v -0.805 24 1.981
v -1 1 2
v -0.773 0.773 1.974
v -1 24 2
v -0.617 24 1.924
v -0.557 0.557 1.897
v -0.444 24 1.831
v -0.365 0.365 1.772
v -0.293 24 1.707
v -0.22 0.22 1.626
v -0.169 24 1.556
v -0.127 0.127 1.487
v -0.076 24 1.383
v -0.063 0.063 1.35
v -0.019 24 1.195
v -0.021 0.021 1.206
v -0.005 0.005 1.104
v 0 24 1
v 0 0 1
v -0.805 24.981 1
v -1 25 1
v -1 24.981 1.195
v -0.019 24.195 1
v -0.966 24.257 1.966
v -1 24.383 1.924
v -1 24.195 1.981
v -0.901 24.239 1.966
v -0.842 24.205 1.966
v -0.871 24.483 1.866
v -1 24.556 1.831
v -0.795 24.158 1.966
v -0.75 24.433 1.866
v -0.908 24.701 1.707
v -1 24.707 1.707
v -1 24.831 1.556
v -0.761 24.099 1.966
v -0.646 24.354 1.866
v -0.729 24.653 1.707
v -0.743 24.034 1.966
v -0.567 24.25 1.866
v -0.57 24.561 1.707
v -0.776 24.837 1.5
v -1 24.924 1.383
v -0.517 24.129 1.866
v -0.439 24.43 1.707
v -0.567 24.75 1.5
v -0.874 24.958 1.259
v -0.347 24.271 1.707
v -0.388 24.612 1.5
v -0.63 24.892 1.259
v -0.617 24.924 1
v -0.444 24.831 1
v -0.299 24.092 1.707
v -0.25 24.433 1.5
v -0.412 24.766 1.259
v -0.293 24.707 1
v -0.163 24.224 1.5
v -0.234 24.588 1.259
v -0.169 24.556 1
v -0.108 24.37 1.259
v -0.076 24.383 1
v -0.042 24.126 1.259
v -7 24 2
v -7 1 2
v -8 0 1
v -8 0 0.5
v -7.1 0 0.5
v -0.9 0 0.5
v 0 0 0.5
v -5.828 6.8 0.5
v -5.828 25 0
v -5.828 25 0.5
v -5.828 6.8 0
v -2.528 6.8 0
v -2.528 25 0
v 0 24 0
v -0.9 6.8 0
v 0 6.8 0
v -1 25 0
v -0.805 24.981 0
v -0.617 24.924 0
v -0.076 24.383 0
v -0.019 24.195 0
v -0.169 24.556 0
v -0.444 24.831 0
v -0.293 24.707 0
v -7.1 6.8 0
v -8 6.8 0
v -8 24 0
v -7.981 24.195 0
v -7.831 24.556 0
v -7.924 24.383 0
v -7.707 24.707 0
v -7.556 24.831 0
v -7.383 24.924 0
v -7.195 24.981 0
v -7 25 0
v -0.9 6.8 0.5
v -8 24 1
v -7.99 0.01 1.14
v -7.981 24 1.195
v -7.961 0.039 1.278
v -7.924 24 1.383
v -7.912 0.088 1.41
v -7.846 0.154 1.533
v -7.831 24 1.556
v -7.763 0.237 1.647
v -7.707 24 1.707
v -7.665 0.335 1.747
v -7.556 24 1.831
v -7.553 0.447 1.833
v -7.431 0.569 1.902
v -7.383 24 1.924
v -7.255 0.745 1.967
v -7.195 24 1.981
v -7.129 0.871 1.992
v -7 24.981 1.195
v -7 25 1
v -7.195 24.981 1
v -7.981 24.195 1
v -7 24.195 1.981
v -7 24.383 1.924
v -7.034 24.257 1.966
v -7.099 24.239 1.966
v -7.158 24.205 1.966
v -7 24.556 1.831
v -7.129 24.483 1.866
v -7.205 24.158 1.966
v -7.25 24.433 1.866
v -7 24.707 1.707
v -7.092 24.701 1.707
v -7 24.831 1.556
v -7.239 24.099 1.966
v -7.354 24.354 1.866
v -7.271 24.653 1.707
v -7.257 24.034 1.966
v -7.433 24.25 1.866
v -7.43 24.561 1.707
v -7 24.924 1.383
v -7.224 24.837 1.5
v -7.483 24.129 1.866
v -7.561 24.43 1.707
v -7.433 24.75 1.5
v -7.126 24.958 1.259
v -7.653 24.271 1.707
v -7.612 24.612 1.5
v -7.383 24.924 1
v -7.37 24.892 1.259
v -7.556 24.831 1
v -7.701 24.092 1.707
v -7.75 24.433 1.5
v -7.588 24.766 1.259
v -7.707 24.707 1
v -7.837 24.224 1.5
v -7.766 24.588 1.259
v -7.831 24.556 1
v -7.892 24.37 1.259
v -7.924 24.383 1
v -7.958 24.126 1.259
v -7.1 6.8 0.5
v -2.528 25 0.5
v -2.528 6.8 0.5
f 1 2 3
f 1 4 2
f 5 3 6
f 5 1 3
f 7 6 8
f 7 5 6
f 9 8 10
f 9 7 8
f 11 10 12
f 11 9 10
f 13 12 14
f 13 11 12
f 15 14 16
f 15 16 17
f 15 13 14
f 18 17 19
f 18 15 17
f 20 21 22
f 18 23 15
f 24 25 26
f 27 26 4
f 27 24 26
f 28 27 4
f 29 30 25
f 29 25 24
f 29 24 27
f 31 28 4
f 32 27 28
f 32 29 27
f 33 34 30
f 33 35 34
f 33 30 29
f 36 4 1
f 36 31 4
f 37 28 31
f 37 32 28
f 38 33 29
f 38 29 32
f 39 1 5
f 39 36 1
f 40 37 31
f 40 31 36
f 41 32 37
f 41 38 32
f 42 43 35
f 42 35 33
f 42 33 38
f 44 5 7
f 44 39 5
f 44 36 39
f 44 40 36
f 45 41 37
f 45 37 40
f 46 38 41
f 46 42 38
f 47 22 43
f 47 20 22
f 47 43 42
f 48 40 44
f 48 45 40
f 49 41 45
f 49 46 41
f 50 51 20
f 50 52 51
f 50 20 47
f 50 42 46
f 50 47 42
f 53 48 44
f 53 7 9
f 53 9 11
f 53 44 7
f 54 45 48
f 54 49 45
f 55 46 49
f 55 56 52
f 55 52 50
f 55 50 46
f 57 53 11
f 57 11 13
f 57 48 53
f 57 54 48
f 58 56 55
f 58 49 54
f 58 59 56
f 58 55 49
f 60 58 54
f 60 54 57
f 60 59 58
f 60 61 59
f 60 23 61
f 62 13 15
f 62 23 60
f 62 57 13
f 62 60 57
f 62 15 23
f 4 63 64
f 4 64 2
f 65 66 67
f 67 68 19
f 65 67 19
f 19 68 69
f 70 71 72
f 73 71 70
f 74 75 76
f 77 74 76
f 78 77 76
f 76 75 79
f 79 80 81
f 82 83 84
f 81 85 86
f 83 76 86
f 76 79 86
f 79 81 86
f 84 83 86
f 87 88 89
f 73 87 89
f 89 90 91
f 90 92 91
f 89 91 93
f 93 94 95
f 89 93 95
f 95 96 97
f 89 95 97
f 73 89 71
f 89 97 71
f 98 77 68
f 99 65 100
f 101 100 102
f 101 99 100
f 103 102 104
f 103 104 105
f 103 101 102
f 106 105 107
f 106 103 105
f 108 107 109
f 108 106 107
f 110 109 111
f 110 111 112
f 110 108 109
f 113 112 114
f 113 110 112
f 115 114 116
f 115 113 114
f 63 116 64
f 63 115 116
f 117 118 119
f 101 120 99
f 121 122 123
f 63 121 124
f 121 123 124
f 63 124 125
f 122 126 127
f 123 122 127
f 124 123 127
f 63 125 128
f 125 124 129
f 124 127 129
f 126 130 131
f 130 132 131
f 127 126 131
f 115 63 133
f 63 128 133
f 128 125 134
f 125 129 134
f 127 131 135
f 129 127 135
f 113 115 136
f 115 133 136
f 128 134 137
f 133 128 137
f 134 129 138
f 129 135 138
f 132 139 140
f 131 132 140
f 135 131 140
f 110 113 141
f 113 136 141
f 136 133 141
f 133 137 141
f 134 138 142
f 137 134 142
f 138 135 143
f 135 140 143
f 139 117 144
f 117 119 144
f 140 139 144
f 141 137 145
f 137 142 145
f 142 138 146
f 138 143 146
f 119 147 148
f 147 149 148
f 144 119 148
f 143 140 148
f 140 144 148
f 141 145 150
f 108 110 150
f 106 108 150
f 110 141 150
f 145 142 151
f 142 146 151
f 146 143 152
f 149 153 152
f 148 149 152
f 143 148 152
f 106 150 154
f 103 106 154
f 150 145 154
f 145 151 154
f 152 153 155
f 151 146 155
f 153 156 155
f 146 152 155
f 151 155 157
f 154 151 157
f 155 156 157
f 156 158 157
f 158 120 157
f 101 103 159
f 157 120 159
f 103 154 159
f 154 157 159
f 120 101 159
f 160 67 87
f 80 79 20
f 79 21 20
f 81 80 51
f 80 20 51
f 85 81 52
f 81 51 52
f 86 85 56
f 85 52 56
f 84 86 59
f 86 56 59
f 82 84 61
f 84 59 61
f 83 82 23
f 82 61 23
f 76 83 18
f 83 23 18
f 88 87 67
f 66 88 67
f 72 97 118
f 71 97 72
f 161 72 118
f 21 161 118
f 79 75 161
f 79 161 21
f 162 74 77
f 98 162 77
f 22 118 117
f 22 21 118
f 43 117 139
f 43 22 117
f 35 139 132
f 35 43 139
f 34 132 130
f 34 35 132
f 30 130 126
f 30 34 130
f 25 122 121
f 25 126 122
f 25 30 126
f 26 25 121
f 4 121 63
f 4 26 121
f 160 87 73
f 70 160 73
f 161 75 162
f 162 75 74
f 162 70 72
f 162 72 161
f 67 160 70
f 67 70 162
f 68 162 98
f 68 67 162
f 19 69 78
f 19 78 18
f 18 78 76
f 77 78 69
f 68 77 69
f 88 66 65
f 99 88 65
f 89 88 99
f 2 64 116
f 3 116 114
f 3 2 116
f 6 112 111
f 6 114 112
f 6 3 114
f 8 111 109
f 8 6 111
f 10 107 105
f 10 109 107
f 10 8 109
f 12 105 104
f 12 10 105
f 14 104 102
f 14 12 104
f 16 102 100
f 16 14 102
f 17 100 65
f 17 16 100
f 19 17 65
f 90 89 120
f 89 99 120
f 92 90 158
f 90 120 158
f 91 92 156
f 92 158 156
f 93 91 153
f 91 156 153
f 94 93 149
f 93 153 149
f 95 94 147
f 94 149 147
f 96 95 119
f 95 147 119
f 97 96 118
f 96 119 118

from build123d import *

# Parameters (mm, degrees)
F0_W     = 8
F0_H     = 25
F1_DEPTH = 2
F2_W     = 3.3
F2_H     = 18.2
F3_DEPTH = 0.5
F5_DEPTH = 8.001
F6_R     = 1


with BuildPart() as f1:
    # F0 (on Top) → F1 (new body)
    with BuildSketch(Plane.XY):
        with Locations((-4, 12.5)):
            Rectangle(F0_W, F0_H)
    extrude(amount=F1_DEPTH)

    # F2 (on face) → F3 (cut)
    with BuildSketch(Plane(origin=(0, 0, 0), x_dir=(1, 0, 0), z_dir=(0, 0, -1))):
        Polygon((-7.1, -6.8), (-5.8275572956, -6.8), (-2.5275572956, -6.8), (-0.9, -6.8), (-0.9, 0), (-7.1, 0), align=None)
        with Locations((-4.1775572956, -15.9)):
            Rectangle(F2_W, F2_H)
    extrude(amount=-F3_DEPTH, mode=Mode.SUBTRACT)

    # F4 (on face) → F5 (cut, through all)
    with BuildSketch(Plane.YZ):
        Polygon((6.8, 0), (0, 0.5), (0, 0), align=None)
    extrude(amount=-F5_DEPTH, mode=Mode.SUBTRACT)

    # F6
    f6_edges = [f1.edges().sort_by_distance(p)[0] for p in [
        (0, 25, 1),
        (-8, 25, 1),
        (-4, 25, 2),
        (0, 12.5, 2),
        (-8, 12.5, 2),
        (-4, 0, 2),
    ]]
    fillet(f6_edges, radius=F6_R)


solid = f1.part
